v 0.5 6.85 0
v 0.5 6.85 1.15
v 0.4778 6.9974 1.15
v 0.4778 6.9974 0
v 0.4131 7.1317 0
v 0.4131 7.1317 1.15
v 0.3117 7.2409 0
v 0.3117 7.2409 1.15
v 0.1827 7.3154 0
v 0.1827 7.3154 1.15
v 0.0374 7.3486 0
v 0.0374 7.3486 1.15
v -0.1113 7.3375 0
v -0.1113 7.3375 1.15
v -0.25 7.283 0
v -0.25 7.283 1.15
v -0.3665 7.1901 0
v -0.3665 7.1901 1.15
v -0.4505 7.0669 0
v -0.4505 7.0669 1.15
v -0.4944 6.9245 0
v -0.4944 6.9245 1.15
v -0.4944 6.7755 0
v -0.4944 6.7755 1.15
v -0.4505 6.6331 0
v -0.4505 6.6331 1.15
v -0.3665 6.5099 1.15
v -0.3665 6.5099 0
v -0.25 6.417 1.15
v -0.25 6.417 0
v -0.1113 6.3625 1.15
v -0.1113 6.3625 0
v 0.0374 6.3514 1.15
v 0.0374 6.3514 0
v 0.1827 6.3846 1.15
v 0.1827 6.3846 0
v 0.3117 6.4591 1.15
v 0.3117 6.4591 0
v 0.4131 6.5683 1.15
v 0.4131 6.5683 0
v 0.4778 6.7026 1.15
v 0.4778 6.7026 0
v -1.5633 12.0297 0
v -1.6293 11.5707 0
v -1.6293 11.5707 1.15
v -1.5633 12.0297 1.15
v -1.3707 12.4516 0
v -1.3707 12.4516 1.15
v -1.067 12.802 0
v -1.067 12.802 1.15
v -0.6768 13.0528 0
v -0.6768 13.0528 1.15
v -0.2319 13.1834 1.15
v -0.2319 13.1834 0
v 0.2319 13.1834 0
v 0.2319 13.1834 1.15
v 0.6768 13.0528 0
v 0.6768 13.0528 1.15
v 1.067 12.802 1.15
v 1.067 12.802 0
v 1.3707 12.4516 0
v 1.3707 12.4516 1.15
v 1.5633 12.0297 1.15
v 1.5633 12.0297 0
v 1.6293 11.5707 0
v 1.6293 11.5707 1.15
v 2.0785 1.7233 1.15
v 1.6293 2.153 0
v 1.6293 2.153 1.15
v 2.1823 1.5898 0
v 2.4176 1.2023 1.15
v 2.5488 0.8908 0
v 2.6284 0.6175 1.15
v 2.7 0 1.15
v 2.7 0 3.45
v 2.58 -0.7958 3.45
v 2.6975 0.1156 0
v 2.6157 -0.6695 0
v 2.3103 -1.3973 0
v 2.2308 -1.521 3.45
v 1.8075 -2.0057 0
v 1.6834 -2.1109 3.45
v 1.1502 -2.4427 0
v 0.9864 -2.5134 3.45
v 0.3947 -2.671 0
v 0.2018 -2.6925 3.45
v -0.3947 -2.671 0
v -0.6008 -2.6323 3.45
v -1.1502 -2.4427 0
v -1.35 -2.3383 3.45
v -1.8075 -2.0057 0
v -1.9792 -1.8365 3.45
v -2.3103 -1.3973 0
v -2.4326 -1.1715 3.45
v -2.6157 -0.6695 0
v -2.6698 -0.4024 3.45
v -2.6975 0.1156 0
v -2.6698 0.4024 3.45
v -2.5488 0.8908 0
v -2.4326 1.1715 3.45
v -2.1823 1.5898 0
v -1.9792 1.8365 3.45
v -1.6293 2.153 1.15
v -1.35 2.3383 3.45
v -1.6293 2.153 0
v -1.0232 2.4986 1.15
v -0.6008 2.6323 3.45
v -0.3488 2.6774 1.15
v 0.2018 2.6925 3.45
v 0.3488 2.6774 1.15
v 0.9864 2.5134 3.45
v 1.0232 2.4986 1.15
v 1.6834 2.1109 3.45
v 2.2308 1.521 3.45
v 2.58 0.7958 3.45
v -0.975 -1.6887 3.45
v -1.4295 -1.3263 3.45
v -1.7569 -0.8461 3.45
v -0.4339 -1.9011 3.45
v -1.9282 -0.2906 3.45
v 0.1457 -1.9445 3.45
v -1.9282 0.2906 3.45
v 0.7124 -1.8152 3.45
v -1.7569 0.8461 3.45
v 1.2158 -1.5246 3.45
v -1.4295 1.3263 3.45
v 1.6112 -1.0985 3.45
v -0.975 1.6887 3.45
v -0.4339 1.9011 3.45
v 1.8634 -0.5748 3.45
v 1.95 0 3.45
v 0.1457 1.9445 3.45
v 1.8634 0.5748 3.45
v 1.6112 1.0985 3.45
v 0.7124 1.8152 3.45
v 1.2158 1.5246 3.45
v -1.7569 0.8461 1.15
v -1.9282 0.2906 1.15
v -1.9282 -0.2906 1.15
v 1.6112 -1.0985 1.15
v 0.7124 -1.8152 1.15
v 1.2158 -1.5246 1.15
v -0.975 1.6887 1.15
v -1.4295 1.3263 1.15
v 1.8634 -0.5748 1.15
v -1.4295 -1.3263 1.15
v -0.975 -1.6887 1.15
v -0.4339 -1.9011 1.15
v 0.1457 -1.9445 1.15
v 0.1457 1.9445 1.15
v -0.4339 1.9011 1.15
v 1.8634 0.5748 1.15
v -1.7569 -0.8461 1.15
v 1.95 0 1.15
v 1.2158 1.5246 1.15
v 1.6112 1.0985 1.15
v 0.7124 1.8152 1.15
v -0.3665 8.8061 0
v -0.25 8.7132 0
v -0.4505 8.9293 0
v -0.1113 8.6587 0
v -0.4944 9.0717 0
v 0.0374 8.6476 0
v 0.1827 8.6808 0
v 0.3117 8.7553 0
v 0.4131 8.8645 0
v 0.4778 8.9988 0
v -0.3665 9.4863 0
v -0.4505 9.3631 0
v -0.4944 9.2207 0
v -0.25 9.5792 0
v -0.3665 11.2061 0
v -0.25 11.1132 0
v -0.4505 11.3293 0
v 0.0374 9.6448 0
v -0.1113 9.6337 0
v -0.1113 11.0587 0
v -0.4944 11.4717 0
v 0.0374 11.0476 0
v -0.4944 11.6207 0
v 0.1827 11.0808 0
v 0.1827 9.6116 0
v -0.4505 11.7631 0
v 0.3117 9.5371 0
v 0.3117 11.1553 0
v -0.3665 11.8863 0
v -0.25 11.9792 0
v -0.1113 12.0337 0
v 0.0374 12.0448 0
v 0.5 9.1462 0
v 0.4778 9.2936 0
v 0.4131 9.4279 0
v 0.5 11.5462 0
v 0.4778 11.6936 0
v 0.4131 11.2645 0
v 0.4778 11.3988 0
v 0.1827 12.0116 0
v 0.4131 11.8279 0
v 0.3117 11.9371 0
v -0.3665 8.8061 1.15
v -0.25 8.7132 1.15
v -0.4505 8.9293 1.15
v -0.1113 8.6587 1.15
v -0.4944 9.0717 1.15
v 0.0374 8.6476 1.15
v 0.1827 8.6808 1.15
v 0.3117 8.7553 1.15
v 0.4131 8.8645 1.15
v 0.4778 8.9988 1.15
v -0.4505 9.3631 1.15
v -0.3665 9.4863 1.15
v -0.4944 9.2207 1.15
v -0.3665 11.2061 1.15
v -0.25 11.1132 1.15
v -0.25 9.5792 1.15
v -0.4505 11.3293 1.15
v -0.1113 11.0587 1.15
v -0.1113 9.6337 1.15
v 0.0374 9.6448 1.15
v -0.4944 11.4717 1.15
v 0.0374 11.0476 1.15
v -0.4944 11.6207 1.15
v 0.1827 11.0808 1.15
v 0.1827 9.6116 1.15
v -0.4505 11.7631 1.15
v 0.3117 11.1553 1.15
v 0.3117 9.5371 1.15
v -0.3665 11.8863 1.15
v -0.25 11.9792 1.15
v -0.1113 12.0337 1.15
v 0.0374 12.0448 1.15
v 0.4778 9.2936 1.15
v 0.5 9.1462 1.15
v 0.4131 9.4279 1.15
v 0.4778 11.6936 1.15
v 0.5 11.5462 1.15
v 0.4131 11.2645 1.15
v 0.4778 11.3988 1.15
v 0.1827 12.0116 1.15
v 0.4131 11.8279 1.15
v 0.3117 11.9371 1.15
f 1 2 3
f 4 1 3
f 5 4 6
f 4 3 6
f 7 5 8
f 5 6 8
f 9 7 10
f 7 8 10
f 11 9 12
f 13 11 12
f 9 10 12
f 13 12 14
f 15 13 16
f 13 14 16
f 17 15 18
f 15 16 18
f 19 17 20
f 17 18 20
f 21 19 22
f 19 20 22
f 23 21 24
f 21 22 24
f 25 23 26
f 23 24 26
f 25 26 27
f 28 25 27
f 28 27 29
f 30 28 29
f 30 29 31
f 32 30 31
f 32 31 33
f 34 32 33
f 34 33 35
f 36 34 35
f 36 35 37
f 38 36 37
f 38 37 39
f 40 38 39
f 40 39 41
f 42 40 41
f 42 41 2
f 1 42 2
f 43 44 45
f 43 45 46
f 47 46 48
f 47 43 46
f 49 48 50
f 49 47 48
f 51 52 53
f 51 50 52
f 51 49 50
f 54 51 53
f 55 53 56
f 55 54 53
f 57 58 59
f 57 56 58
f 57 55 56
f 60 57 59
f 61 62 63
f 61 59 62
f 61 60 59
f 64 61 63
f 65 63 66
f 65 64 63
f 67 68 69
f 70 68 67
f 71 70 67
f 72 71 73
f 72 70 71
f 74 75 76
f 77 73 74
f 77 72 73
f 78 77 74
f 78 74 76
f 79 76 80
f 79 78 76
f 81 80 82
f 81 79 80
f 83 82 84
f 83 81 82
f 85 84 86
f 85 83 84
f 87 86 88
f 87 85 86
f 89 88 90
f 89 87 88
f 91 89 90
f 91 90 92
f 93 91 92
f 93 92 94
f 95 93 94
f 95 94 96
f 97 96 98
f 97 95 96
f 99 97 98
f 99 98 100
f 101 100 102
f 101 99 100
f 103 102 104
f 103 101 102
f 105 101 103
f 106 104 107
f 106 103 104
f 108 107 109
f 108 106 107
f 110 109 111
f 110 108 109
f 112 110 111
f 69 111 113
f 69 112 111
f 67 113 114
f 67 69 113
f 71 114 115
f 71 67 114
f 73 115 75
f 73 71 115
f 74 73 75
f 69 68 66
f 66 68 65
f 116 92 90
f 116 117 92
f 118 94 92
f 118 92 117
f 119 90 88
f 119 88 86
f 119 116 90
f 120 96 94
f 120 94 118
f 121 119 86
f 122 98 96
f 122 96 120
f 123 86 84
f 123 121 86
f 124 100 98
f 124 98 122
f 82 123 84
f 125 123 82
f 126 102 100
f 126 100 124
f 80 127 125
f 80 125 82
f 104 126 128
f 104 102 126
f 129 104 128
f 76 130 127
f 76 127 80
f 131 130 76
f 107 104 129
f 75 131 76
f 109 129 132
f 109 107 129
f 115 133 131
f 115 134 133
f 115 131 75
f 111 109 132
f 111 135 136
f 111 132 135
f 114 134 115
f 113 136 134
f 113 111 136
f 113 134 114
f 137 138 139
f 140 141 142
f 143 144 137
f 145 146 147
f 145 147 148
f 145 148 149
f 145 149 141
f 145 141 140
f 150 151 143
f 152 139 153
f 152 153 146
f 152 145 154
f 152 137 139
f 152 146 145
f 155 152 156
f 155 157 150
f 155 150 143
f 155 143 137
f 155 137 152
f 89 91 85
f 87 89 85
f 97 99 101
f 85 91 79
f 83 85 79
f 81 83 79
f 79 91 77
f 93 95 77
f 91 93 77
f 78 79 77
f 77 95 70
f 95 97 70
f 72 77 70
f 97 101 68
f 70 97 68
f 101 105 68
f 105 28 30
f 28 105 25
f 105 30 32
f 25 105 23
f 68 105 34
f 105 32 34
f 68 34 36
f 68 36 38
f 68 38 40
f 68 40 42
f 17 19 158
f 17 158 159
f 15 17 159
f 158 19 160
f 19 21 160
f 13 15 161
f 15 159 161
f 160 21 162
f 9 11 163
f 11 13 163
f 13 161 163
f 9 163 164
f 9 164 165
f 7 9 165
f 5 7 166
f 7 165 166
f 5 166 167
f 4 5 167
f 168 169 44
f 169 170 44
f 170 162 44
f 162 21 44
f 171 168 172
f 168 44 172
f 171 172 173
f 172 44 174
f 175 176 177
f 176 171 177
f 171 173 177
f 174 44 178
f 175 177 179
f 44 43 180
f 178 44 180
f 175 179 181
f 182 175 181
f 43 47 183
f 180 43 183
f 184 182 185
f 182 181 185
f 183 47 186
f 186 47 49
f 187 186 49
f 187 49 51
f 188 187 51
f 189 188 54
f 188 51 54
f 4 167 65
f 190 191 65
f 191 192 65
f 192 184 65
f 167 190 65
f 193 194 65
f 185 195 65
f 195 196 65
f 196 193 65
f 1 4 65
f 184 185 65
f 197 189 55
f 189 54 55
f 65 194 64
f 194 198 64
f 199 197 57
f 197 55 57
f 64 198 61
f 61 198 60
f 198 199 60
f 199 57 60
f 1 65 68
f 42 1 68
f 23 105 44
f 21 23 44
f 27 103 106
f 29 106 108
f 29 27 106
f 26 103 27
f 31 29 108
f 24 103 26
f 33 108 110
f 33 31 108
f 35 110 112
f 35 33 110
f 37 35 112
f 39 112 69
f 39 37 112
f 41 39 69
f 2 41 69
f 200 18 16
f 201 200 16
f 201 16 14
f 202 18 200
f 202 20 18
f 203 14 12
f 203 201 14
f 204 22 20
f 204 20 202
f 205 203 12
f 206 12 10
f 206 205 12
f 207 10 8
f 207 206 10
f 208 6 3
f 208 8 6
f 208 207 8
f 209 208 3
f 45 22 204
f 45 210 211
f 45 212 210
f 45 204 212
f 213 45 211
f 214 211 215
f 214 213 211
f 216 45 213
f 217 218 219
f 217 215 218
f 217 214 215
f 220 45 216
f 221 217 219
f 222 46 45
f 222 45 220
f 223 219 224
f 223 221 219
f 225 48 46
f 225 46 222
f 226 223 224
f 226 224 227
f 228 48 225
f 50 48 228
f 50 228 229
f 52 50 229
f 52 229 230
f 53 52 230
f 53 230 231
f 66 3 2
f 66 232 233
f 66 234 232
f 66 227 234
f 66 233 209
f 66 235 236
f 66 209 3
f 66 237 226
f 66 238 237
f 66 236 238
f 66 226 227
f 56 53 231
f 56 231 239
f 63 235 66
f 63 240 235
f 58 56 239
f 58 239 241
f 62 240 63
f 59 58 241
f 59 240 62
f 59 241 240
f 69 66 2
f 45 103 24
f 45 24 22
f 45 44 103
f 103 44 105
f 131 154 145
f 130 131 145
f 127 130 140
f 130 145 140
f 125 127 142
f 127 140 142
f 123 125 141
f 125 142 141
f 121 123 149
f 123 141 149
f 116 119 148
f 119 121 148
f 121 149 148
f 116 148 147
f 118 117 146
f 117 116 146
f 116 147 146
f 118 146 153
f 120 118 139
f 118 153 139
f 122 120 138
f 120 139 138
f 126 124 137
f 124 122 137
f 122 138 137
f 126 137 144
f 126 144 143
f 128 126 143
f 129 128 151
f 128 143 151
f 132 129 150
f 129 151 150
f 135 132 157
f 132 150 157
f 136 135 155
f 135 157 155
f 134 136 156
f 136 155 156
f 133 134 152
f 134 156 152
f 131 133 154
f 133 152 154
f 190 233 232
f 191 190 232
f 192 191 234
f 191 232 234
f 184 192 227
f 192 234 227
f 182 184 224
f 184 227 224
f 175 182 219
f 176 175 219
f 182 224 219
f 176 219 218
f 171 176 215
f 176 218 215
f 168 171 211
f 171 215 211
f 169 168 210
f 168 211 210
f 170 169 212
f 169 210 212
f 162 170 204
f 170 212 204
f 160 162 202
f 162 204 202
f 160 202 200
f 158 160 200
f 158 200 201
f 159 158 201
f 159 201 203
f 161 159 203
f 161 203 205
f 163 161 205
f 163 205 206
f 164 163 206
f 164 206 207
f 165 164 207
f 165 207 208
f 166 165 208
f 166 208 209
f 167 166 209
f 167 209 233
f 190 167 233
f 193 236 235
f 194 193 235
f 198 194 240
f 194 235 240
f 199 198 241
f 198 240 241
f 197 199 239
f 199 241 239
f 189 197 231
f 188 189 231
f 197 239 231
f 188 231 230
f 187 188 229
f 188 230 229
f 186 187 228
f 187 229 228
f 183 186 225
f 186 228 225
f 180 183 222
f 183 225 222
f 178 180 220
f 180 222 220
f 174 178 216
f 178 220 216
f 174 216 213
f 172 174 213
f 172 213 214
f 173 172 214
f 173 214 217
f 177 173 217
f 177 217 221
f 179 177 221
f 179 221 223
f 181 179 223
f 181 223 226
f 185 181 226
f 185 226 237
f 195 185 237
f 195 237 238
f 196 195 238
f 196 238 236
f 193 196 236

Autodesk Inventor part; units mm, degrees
ref_plane "YZ Plane" through (0, 0, 0) normal (1, 0, 0) x (0, 1, 0)
ref_plane "XZ Plane" through (0, 0, 0) normal (0, 1, 0) x (-1, 0, 0)
ref_plane "XY Plane" through (0, 0, 0) normal (0, 0, 1) x (1, 0, 0)
sketch "草图1" plane through (0, 0, 0) normal (0, 0, 1) x (1, 0, 0)
  circle A0 centre (0, 0) radius 2.7
  circle A1 centre (0, 0) radius 1.6
  line L0 (0, 0) -> (0, 11.5707) construction
  line L1 (1.6293, 0) -> (1.6293, 11.5707)
  line L2 (-1.6293, 11.5707) -> (-1.6293, 0)
  arc A2 (-1.6293, 0) -> (1.6293, 0) centre (0, 0) ccw
  arc A3 (1.6293, 11.5707) -> (-1.6293, 11.5707) centre (0, 11.5707) ccw
  point P0 (0, 5.7853)
  point P1 (0, 13.2)
  point P2 (0, -2.7)
  point P3 (-1.6293, 2.153)
  point P4 (1.6293, 2.153)
  dimension "d0" = 5.4
  dimension "d1" = 3.2
  dimension "d2" = 15.9
extrude "拉伸1" add sketch "草图1" along normal blind 1.15 contours A0 L2 A2 L1 | L1 A2 L2 A0 | A0 L2 A3 L1 | A1
sketch "草图2" plane through (0, 0, 1.15) normal (0, 0, 1) x (1, 0, 0)
  circle A0 centre (0, 0) radius 1.95
  circle A1 centre (0, 0) radius 2.7
  dimension "d5" = 3.9
extrude "拉伸2" add sketch "草图2" along normal blind 2.3
sketch "草图3" plane through (0, 0, 1.15) normal (0, 0, 1) x (1, 0, 0)
  circle A0 centre (0, 11.5462) radius 0.5
  circle A1 centre (0, 9.1462) radius 0.5
  circle A2 centre (0, 6.85) radius 0.5
  circle A3 centre (0, 0) radius 1.95 projected
  dimension "d8" = 1
  dimension "d9" = 1
  dimension "d10" = 1
  dimension "d12" = 6.85
  dimension "d13" = 2.4
extrude "拉伸3" cut sketch "草图3" against normal blind 2.3 contours A0 | A1 | A2
properties part number "摆臂"
